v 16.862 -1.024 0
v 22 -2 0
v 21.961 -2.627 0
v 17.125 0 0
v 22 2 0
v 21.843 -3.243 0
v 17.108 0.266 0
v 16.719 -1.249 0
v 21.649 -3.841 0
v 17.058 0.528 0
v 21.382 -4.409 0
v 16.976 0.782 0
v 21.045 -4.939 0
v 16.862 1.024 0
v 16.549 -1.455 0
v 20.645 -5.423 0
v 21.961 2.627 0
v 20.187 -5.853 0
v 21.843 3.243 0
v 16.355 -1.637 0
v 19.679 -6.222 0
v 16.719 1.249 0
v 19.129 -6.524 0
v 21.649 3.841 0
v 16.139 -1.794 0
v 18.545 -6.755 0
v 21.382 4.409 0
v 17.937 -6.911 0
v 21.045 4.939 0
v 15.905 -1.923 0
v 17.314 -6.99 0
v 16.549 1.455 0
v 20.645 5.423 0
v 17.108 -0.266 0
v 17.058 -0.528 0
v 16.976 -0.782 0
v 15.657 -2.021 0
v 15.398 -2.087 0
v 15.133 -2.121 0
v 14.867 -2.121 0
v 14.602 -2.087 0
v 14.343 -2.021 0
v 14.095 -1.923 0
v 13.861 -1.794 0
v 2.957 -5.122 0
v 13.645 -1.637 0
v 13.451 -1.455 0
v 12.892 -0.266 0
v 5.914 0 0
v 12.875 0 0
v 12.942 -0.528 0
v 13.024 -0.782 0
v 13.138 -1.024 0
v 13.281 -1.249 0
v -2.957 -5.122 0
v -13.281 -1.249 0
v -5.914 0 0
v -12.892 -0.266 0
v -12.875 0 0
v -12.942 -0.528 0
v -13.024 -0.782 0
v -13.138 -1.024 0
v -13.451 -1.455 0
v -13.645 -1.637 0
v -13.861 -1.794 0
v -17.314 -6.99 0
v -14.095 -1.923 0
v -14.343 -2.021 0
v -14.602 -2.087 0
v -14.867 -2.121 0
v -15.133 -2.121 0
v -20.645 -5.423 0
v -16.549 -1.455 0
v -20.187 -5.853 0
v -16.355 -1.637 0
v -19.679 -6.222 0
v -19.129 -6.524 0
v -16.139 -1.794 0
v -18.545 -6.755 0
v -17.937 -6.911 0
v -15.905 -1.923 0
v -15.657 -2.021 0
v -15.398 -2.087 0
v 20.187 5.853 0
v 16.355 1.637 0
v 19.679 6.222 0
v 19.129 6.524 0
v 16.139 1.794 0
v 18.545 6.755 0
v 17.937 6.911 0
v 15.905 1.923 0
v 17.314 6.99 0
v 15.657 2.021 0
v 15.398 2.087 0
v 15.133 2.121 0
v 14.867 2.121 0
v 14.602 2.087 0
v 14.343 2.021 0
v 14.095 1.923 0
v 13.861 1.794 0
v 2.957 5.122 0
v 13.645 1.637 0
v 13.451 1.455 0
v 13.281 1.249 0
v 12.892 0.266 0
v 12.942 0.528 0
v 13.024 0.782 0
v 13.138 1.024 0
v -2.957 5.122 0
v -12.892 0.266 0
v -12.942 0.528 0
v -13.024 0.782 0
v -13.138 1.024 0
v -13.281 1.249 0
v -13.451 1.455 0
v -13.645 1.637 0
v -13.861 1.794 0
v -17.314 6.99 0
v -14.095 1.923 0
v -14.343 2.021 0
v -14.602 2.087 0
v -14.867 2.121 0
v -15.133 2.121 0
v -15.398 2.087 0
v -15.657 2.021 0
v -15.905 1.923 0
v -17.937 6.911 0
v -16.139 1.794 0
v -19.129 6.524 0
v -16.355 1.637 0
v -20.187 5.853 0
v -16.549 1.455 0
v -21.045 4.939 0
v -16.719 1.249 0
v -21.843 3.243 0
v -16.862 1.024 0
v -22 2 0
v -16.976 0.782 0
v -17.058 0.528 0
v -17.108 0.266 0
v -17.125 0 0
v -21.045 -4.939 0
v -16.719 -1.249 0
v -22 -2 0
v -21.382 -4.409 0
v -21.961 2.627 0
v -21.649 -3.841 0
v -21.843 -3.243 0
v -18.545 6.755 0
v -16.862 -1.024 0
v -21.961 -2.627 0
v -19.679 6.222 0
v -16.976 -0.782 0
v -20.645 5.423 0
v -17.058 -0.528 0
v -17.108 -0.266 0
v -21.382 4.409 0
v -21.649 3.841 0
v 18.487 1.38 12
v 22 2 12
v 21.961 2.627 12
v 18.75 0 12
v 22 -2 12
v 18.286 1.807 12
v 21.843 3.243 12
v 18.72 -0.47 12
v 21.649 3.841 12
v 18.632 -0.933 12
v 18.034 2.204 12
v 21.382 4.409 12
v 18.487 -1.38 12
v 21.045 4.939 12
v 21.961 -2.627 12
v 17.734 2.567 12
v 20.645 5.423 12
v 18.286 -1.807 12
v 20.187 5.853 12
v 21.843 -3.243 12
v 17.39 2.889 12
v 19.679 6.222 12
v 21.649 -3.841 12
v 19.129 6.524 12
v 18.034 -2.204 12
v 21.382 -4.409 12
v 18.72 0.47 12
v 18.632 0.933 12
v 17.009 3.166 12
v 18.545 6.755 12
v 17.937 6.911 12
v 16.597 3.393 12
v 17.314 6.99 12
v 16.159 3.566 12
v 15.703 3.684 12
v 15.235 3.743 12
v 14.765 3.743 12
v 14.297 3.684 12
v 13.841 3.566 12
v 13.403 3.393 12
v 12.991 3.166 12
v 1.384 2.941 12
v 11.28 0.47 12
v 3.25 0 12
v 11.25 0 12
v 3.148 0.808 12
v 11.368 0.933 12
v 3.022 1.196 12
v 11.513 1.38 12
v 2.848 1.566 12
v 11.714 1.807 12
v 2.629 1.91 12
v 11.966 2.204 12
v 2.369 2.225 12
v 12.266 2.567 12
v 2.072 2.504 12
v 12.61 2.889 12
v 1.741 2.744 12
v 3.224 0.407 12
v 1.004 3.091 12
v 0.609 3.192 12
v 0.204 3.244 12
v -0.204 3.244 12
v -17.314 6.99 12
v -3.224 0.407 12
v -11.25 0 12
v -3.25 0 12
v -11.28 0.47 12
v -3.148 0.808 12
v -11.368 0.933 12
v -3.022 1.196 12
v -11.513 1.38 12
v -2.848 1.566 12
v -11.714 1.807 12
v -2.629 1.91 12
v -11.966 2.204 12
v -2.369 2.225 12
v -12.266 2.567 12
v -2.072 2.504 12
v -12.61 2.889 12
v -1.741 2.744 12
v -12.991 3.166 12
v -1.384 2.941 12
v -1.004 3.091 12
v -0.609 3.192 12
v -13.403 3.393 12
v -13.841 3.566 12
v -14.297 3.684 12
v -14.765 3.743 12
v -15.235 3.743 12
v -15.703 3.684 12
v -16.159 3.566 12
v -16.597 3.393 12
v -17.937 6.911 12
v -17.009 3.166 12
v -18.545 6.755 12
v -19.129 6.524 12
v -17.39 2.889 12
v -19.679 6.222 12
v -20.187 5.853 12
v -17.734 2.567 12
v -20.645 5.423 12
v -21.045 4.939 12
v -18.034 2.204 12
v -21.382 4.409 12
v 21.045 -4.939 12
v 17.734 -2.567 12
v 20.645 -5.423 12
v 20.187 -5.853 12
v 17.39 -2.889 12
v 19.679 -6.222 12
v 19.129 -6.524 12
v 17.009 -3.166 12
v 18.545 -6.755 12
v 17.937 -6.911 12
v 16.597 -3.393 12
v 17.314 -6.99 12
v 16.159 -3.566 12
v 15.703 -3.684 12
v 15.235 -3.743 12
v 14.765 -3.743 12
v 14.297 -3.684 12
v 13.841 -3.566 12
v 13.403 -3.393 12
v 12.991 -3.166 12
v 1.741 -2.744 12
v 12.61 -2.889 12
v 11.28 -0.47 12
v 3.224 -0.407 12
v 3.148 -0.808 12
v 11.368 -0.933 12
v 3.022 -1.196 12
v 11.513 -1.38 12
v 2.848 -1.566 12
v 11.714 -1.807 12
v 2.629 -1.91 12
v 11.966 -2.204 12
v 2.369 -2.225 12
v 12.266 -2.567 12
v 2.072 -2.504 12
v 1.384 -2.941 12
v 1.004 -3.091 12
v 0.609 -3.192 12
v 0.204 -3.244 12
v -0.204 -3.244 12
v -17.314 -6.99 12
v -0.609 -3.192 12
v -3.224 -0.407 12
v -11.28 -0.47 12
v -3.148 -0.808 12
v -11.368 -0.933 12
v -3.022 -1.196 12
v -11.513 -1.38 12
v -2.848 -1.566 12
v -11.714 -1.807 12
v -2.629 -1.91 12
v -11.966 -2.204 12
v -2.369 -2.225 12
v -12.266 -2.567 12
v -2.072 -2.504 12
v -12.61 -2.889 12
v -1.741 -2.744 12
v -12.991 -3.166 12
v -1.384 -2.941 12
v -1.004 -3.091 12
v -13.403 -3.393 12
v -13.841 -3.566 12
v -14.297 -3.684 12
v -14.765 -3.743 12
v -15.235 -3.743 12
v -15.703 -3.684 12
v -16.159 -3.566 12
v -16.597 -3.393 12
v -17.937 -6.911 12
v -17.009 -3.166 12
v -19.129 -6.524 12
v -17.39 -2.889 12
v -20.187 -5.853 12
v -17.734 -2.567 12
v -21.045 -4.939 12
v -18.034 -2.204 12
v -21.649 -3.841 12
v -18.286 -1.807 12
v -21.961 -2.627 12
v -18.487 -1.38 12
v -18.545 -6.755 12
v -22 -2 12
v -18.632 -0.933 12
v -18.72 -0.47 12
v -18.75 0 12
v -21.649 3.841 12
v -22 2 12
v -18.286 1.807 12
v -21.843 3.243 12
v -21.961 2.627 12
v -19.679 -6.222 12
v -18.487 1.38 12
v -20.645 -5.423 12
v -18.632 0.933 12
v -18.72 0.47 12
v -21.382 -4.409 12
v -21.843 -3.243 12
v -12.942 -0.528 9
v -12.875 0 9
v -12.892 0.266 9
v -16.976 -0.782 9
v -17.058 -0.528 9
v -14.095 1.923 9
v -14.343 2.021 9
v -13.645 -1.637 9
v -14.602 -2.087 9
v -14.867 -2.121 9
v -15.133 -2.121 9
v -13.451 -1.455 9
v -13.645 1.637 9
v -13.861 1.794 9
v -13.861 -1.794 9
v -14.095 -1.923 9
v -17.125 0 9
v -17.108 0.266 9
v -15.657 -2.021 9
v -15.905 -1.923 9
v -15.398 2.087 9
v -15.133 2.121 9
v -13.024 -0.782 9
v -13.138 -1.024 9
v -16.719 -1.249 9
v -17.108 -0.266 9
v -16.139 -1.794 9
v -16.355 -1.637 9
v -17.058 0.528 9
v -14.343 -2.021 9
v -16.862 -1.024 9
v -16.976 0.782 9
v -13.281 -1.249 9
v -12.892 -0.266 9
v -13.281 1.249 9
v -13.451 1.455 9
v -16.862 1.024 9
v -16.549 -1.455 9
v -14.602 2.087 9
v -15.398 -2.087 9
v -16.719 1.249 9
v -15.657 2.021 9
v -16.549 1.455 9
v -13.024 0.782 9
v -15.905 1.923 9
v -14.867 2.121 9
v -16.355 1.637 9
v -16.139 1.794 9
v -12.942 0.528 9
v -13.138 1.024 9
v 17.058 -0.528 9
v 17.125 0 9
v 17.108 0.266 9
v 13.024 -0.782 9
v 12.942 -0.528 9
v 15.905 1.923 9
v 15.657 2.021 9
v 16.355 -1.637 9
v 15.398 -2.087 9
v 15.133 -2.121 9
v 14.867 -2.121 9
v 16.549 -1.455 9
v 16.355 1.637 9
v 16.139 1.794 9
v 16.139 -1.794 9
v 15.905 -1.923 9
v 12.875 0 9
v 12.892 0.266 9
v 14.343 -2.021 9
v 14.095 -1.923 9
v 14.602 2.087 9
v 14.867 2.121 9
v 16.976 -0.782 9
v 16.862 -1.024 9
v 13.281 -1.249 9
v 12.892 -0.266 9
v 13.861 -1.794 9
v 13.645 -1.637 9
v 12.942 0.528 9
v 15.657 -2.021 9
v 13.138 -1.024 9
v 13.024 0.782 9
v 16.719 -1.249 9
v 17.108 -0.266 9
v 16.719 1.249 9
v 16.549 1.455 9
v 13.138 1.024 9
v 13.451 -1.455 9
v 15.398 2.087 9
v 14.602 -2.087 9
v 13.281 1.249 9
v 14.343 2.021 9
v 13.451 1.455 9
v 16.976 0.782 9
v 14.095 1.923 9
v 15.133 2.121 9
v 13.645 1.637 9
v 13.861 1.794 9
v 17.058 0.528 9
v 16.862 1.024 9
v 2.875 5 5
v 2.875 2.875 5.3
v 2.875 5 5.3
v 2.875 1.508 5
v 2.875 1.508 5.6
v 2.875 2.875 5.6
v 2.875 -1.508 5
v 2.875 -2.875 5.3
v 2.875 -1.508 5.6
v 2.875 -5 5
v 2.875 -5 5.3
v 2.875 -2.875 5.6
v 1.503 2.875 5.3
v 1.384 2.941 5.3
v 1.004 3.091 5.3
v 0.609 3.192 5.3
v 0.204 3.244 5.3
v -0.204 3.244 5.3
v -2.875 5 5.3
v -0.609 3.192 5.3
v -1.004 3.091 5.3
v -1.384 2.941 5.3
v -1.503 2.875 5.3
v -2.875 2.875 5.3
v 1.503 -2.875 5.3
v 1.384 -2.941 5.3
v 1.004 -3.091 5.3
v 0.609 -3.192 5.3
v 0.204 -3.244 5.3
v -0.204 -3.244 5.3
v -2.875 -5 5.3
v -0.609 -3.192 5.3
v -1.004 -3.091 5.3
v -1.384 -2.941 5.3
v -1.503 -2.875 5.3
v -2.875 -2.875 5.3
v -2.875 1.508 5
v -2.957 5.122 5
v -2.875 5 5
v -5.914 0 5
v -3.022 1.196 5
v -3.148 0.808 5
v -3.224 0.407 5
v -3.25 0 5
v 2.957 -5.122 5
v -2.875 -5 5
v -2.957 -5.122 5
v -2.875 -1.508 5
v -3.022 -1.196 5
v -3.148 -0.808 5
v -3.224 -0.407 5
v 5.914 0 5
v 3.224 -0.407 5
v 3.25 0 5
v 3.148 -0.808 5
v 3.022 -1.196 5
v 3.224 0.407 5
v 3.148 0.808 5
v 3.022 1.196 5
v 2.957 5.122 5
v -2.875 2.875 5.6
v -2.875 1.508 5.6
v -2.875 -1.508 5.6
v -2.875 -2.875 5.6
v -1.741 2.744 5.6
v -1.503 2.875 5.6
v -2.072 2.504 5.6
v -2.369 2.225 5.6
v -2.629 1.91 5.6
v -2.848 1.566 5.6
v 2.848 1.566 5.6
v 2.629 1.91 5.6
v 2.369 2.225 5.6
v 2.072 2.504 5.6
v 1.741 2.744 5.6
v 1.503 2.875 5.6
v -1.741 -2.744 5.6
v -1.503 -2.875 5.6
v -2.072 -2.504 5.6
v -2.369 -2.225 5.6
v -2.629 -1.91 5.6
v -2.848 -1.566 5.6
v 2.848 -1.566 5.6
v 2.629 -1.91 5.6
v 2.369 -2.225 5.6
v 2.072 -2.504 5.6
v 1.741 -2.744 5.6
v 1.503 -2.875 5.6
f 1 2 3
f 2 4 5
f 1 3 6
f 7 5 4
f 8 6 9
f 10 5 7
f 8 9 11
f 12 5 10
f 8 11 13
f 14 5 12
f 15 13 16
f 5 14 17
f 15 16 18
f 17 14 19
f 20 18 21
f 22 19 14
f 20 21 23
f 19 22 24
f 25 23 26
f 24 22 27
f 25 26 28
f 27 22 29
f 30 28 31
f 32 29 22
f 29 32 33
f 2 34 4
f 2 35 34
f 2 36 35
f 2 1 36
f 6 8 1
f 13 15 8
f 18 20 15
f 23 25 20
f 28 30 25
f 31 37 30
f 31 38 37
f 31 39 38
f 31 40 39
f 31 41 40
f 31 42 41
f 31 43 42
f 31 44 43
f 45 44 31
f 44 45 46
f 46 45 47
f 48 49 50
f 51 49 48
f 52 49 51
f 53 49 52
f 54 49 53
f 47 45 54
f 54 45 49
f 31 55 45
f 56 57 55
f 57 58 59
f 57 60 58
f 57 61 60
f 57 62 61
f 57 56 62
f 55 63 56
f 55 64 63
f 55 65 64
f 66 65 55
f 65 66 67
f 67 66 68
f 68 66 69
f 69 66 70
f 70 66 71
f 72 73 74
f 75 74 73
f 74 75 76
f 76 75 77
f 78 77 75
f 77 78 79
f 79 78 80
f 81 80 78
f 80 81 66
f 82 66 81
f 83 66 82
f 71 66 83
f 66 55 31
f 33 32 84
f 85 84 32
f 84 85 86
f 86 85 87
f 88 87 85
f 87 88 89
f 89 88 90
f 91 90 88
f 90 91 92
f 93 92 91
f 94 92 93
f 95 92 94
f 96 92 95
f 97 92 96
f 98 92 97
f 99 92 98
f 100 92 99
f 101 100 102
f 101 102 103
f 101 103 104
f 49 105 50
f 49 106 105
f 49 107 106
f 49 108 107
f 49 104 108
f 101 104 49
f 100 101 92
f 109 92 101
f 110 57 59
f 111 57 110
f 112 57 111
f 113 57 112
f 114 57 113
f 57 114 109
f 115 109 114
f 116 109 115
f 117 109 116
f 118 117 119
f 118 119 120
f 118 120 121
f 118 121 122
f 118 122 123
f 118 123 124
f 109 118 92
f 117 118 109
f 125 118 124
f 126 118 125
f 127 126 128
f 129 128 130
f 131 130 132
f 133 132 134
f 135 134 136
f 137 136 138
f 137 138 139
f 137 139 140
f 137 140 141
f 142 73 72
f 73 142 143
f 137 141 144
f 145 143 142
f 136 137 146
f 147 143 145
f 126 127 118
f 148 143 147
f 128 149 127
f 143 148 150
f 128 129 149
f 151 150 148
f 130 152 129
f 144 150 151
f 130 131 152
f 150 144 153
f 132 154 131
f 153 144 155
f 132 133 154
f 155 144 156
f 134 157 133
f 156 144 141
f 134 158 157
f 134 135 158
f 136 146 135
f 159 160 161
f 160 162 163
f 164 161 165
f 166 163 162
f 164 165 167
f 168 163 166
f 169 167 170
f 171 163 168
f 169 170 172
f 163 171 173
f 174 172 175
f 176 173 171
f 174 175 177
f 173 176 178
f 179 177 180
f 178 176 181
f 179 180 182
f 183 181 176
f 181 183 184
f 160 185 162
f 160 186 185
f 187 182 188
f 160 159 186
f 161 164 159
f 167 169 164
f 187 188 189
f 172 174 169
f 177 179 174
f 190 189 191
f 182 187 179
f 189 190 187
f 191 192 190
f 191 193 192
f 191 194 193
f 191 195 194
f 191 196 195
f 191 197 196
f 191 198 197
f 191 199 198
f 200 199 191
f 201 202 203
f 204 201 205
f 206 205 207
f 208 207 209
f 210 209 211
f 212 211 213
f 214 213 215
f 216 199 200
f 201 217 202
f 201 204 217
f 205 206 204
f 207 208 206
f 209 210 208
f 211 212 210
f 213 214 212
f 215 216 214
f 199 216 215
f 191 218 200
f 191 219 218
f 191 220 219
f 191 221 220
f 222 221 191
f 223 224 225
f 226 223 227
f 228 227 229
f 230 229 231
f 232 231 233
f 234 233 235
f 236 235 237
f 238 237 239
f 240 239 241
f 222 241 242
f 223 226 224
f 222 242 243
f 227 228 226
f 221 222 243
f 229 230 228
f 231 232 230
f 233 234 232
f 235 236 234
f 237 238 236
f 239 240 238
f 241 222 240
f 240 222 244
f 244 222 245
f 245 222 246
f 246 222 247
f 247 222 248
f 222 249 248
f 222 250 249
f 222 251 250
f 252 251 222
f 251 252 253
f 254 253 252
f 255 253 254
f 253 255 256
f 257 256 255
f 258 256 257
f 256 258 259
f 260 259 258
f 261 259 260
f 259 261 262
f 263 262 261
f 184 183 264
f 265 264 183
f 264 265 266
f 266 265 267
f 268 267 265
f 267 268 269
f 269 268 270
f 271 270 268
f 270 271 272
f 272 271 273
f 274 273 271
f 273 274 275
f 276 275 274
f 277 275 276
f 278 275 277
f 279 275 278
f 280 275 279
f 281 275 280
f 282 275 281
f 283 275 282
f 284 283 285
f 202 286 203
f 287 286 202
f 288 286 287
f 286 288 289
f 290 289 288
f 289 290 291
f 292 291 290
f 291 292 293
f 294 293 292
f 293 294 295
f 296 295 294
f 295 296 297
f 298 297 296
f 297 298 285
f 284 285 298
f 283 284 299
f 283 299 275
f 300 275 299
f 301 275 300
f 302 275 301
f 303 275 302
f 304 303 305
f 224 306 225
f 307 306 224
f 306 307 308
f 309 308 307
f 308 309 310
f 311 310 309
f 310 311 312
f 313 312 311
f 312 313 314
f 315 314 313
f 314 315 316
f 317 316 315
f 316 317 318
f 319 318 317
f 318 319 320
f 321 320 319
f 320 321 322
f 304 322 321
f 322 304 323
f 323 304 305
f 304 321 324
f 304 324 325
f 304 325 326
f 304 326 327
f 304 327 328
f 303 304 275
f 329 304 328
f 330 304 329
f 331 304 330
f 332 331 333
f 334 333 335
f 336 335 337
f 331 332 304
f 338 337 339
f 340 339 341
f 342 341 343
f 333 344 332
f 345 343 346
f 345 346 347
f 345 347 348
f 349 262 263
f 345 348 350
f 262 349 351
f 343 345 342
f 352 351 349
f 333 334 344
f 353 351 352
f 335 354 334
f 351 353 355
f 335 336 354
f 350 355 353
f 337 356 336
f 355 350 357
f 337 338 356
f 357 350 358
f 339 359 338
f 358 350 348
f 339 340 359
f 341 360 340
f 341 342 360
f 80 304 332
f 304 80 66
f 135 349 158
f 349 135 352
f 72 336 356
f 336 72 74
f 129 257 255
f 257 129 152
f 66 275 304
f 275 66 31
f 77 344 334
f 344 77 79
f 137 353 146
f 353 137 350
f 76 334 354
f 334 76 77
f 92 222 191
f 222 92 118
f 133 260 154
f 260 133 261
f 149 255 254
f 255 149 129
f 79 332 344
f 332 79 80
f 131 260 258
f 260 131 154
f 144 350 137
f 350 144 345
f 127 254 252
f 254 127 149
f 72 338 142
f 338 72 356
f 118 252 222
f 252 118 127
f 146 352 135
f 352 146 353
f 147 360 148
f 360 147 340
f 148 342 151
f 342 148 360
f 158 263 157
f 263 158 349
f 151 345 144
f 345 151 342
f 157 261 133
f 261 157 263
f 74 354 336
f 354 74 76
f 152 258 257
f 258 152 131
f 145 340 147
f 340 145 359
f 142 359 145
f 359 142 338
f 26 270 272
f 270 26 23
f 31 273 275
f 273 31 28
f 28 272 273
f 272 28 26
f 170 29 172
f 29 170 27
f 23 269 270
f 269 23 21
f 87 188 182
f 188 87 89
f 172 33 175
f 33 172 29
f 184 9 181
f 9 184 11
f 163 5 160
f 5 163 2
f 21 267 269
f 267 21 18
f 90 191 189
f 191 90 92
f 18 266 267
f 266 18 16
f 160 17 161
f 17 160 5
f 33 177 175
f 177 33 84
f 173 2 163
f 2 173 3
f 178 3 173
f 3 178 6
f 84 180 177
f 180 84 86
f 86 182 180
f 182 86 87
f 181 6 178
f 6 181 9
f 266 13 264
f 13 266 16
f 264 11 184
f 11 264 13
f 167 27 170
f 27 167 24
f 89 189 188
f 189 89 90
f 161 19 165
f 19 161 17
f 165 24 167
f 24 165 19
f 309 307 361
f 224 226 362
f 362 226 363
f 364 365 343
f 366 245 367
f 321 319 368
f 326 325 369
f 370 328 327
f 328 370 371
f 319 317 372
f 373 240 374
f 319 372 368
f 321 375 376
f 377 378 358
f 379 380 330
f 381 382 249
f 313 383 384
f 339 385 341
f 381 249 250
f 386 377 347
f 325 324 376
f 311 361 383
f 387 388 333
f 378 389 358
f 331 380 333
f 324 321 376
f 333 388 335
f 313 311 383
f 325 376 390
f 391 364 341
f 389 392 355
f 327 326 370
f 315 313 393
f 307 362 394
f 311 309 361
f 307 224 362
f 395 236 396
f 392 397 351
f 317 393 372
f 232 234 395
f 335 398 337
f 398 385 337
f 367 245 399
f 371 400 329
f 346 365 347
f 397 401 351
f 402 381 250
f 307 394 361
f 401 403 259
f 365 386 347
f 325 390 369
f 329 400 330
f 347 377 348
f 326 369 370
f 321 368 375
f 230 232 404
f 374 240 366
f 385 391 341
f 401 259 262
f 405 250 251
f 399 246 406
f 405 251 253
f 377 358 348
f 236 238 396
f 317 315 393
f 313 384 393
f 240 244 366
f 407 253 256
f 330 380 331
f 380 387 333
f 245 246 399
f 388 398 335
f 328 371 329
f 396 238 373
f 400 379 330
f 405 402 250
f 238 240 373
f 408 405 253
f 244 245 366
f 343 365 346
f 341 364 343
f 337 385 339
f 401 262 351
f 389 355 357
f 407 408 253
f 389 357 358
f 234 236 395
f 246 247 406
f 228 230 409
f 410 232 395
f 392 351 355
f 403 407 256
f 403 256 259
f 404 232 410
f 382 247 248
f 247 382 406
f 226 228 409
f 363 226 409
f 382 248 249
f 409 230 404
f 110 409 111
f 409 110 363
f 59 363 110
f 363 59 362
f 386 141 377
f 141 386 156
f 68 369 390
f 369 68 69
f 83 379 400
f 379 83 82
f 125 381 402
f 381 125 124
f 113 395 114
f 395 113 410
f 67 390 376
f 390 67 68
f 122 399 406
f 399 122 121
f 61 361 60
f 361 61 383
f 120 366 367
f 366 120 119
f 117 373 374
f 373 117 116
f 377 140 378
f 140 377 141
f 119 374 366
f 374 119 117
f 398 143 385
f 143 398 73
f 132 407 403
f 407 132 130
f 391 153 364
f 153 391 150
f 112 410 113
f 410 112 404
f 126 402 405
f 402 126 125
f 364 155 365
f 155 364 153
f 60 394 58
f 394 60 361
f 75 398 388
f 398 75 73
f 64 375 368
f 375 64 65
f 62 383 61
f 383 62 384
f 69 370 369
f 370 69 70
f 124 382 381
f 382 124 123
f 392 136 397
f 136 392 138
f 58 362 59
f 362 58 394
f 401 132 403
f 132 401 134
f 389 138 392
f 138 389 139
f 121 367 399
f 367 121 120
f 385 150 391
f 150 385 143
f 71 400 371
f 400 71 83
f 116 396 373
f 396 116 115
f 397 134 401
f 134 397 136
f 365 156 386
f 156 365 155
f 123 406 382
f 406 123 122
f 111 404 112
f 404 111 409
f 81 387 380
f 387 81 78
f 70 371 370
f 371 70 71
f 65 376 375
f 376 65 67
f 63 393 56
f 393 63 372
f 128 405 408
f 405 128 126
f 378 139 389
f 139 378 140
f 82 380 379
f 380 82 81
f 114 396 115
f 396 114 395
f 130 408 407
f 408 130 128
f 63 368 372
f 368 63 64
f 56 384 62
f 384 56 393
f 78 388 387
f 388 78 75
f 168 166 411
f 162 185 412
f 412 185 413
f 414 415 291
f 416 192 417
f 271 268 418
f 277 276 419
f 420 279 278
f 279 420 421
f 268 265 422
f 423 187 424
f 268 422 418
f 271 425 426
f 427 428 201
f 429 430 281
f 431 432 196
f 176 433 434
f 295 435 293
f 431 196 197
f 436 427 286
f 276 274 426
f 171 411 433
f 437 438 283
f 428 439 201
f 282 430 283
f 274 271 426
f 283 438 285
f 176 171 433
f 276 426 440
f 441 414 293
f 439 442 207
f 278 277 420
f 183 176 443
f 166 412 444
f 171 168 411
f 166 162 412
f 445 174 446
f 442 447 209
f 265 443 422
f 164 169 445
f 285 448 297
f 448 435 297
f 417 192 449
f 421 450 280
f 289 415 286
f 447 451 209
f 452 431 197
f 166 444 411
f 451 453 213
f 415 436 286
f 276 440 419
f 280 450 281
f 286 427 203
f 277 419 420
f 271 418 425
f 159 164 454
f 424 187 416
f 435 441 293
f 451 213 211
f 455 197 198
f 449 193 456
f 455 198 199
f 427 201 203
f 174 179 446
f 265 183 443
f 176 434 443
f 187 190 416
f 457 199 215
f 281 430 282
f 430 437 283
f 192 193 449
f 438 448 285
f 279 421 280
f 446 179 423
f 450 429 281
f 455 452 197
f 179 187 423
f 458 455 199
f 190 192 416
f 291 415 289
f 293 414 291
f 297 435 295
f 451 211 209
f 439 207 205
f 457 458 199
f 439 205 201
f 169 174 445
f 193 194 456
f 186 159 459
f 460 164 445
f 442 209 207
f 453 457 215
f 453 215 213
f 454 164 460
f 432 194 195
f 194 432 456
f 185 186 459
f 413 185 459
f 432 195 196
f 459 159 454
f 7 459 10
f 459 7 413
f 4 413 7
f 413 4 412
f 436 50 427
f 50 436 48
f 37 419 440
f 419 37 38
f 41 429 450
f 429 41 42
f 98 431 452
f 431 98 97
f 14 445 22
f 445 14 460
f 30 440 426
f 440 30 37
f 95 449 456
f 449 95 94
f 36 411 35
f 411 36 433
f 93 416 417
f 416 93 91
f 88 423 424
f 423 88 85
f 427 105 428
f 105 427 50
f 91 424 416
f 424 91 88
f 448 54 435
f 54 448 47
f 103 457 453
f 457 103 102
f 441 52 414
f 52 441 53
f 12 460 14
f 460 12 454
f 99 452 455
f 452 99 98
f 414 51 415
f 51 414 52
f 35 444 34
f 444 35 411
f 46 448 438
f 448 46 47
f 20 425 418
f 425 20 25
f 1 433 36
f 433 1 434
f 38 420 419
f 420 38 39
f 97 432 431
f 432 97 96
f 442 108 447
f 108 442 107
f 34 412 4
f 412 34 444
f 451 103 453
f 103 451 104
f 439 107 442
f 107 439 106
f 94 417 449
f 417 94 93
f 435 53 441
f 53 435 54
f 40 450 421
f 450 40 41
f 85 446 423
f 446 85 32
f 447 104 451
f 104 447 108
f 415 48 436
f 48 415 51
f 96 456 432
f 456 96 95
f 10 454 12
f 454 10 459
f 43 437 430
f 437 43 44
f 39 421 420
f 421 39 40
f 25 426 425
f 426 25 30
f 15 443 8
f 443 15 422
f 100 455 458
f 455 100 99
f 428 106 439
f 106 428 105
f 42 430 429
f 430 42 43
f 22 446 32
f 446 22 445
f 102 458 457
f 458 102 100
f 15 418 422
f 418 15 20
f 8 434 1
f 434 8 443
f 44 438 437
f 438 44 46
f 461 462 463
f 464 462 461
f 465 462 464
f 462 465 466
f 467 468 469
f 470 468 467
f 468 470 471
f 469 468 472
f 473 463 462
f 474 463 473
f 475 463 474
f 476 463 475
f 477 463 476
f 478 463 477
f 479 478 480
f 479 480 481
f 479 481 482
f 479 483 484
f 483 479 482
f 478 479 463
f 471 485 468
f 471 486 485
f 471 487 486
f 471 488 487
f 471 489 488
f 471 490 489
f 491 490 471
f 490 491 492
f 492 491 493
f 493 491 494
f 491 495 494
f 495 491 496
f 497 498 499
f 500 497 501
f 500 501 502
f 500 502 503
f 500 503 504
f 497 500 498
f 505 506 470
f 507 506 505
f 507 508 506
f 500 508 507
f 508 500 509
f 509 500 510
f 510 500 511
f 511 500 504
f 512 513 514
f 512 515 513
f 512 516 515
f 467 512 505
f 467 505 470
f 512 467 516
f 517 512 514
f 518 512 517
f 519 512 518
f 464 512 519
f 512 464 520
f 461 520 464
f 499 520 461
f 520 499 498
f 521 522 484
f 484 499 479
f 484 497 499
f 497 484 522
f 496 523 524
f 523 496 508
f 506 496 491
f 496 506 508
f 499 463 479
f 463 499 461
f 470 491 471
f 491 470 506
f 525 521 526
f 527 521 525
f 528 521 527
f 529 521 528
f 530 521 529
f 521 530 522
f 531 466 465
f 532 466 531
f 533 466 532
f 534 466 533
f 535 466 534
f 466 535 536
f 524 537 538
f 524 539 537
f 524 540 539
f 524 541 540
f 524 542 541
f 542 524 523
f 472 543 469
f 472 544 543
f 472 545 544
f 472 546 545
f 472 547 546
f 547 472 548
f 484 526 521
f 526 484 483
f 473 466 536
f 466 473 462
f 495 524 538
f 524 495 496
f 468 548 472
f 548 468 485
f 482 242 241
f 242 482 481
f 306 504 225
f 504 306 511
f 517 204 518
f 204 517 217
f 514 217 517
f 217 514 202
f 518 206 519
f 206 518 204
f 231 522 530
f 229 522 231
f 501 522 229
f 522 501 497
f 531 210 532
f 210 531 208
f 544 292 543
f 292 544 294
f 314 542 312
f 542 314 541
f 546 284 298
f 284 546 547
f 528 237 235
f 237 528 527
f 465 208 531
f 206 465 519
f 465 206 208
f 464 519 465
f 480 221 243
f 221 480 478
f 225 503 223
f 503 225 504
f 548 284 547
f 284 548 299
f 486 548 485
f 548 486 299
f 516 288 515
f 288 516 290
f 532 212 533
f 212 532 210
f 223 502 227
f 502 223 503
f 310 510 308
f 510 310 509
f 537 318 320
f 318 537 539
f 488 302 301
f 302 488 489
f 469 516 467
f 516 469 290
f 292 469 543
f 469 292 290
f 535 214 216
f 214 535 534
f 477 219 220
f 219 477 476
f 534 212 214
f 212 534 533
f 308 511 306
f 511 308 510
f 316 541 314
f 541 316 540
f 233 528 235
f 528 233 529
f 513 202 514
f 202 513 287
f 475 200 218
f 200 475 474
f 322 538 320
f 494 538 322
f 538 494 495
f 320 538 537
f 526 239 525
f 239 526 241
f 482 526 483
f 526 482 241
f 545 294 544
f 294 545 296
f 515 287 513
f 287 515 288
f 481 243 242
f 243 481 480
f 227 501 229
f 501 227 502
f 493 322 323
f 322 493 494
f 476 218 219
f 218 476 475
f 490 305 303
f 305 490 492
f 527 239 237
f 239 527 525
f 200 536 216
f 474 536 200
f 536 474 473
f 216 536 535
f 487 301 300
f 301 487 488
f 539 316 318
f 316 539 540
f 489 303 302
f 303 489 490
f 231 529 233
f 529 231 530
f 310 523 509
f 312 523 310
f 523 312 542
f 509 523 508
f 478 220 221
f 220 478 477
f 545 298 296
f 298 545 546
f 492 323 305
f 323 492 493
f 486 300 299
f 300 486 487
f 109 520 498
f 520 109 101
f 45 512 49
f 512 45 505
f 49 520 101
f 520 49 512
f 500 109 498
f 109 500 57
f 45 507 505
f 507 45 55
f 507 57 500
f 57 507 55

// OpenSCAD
$fn = 50;


difference() {
	union() {
		cylinder(h = 12, r = 7.0000000000);
		translate(v = [-7.5000000000, 0.0000000000, 0]) {
			hull() {
				translate(v = [-9.5000000000, 2.0000000000, 0]) {
					cylinder(h = 12, r = 5);
				}
				translate(v = [9.5000000000, 2.0000000000, 0]) {
					cylinder(h = 12, r = 5);
				}
				translate(v = [-9.5000000000, -2.0000000000, 0]) {
					cylinder(h = 12, r = 5);
				}
				translate(v = [9.5000000000, -2.0000000000, 0]) {
					cylinder(h = 12, r = 5);
				}
			}
		}
		translate(v = [-7.5000000000, 0.0000000000, 0]) {
			hull() {
				translate(v = [-9.5000000000, 2.0000000000, 0]) {
					cylinder(h = 12, r = 5);
				}
				translate(v = [9.5000000000, 2.0000000000, 0]) {
					cylinder(h = 12, r = 5);
				}
				translate(v = [-9.5000000000, -2.0000000000, 0]) {
					cylinder(h = 12, r = 5);
				}
				translate(v = [9.5000000000, -2.0000000000, 0]) {
					cylinder(h = 12, r = 5);
				}
			}
		}
		translate(v = [7.5000000000, 0.0000000000, 0]) {
			hull() {
				translate(v = [-9.5000000000, 2.0000000000, 0]) {
					cylinder(h = 12, r = 5);
				}
				translate(v = [9.5000000000, 2.0000000000, 0]) {
					cylinder(h = 12, r = 5);
				}
				translate(v = [-9.5000000000, -2.0000000000, 0]) {
					cylinder(h = 12, r = 5);
				}
				translate(v = [9.5000000000, -2.0000000000, 0]) {
					cylinder(h = 12, r = 5);
				}
			}
		}
		translate(v = [7.5000000000, 0.0000000000, 0]) {
			hull() {
				translate(v = [-9.5000000000, 2.0000000000, 0]) {
					cylinder(h = 12, r = 5);
				}
				translate(v = [9.5000000000, 2.0000000000, 0]) {
					cylinder(h = 12, r = 5);
				}
				translate(v = [-9.5000000000, -2.0000000000, 0]) {
					cylinder(h = 12, r = 5);
				}
				translate(v = [9.5000000000, -2.0000000000, 0]) {
					cylinder(h = 12, r = 5);
				}
			}
		}
	}
	union() {
		translate(v = [-15.0000000000, 0.0000000000, 12]) {
			rotate(a = [0, 0, 0]) {
				difference() {
					union() {
						#translate(v = [0, 0, -12.0000000000]) {
							cylinder(h = 12, r = 2.0000000000);
						}
						#translate(v = [0, 0, -3]) {
							cylinder(h = 3, r1 = 2.1250000000, r2 = 3.7500000000);
						}
						#translate(v = [0, 0, -12.0000000000]) {
							cylinder(h = 12, r = 2.1250000000);
						}
						#translate(v = [0, 0, -12.0000000000]) {
							cylinder(h = 12, r = 2.0000000000);
						}
					}
					union();
				}
			}
		}
		translate(v = [-15.0000000000, 0.0000000000, 12]) {
			rotate(a = [0, 0, 0]) {
				difference() {
					union() {
						#translate(v = [0, 0, -12.0000000000]) {
							cylinder(h = 12, r = 2.0000000000);
						}
						#translate(v = [0, 0, -3]) {
							cylinder(h = 3, r1 = 2.1250000000, r2 = 3.7500000000);
						}
						#translate(v = [0, 0, -12.0000000000]) {
							cylinder(h = 12, r = 2.1250000000);
						}
						#translate(v = [0, 0, -12.0000000000]) {
							cylinder(h = 12, r = 2.0000000000);
						}
					}
					union();
				}
			}
		}
		translate(v = [15.0000000000, 0.0000000000, 12]) {
			rotate(a = [0, 0, 0]) {
				difference() {
					union() {
						#translate(v = [0, 0, -12.0000000000]) {
							cylinder(h = 12, r = 2.0000000000);
						}
						#translate(v = [0, 0, -3]) {
							cylinder(h = 3, r1 = 2.1250000000, r2 = 3.7500000000);
						}
						#translate(v = [0, 0, -12.0000000000]) {
							cylinder(h = 12, r = 2.1250000000);
						}
						#translate(v = [0, 0, -12.0000000000]) {
							cylinder(h = 12, r = 2.0000000000);
						}
					}
					union();
				}
			}
		}
		translate(v = [15.0000000000, 0.0000000000, 12]) {
			rotate(a = [0, 0, 0]) {
				difference() {
					union() {
						#translate(v = [0, 0, -12.0000000000]) {
							cylinder(h = 12, r = 2.0000000000);
						}
						#translate(v = [0, 0, -3]) {
							cylinder(h = 3, r1 = 2.1250000000, r2 = 3.7500000000);
						}
						#translate(v = [0, 0, -12.0000000000]) {
							cylinder(h = 12, r = 2.1250000000);
						}
						#translate(v = [0, 0, -12.0000000000]) {
							cylinder(h = 12, r = 2.0000000000);
						}
					}
					union();
				}
			}
		}
		translate(v = [0.0000000000, 0.0000000000, 0]) {
			rotate(a = [0, 0, 0]) {
				difference() {
					union() {
						#translate(v = [-2.8750000000, -5.0000000000, -0.3000000000]) {
							cube(size = [5.7500000000, 10, 0.3000000000]);
						}
						#translate(v = [-2.8750000000, -2.8750000000, -0.6000000000]) {
							cube(size = [5.7500000000, 5.7500000000, 0.3000000000]);
						}
						#translate(v = [-2.8750000000, -5.0000000000, 5]) {
							cube(size = [5.7500000000, 10, 0.3000000000]);
						}
						#translate(v = [-2.8750000000, -2.8750000000, 5.3000000000]) {
							cube(size = [5.7500000000, 5.7500000000, 0.3000000000]);
						}
						#translate(v = [0, 0, -100.0000000000]) {
							cylinder(h = 200, r = 3.2500000000);
						}
						#linear_extrude(height = 5) {
							polygon(points = [[5.9142500000, 0.0000000000], [2.9571250000, 5.1218907443], [-2.9571250000, 5.1218907443], [-5.9142500000, 0.0000000000], [-2.9571250000, -5.1218907443], [2.9571250000, -5.1218907443]]);
						}
						#translate(v = [-2.8750000000, -5.0000000000, -0.3000000000]) {
							cube(size = [5.7500000000, 10, 0.3000000000]);
						}
						#translate(v = [-2.8750000000, -2.8750000000, -0.6000000000]) {
							cube(size = [5.7500000000, 5.7500000000, 0.3000000000]);
						}
						#translate(v = [-2.8750000000, -5.0000000000, 5]) {
							cube(size = [5.7500000000, 10, 0.3000000000]);
						}
						#translate(v = [-2.8750000000, -2.8750000000, 5.3000000000]) {
							cube(size = [5.7500000000, 5.7500000000, 0.3000000000]);
						}
						#translate(v = [0, 0, -100.0000000000]) {
							cylinder(h = 200, r = 3.2500000000);
						}
						#translate(v = [-2.8750000000, -5.0000000000, -0.3000000000]) {
							cube(size = [5.7500000000, 10, 0.3000000000]);
						}
						#translate(v = [-2.8750000000, -2.8750000000, -0.6000000000]) {
							cube(size = [5.7500000000, 5.7500000000, 0.3000000000]);
						}
						#translate(v = [-2.8750000000, -5.0000000000, 5]) {
							cube(size = [5.7500000000, 10, 0.3000000000]);
						}
						#translate(v = [-2.8750000000, -2.8750000000, 5.3000000000]) {
							cube(size = [5.7500000000, 5.7500000000, 0.3000000000]);
						}
						#translate(v = [0, 0, -100.0000000000]) {
							cylinder(h = 200, r = 3.2500000000);
						}
					}
					union();
				}
			}
		}
		translate(v = [0, 0, -100]) {
			cylinder(h = 200, r = 3.2500000000);
		}
		translate(v = [0, 0, -100]) {
			cylinder(h = 200, r = 1.8000000000);
		}
	}
}
